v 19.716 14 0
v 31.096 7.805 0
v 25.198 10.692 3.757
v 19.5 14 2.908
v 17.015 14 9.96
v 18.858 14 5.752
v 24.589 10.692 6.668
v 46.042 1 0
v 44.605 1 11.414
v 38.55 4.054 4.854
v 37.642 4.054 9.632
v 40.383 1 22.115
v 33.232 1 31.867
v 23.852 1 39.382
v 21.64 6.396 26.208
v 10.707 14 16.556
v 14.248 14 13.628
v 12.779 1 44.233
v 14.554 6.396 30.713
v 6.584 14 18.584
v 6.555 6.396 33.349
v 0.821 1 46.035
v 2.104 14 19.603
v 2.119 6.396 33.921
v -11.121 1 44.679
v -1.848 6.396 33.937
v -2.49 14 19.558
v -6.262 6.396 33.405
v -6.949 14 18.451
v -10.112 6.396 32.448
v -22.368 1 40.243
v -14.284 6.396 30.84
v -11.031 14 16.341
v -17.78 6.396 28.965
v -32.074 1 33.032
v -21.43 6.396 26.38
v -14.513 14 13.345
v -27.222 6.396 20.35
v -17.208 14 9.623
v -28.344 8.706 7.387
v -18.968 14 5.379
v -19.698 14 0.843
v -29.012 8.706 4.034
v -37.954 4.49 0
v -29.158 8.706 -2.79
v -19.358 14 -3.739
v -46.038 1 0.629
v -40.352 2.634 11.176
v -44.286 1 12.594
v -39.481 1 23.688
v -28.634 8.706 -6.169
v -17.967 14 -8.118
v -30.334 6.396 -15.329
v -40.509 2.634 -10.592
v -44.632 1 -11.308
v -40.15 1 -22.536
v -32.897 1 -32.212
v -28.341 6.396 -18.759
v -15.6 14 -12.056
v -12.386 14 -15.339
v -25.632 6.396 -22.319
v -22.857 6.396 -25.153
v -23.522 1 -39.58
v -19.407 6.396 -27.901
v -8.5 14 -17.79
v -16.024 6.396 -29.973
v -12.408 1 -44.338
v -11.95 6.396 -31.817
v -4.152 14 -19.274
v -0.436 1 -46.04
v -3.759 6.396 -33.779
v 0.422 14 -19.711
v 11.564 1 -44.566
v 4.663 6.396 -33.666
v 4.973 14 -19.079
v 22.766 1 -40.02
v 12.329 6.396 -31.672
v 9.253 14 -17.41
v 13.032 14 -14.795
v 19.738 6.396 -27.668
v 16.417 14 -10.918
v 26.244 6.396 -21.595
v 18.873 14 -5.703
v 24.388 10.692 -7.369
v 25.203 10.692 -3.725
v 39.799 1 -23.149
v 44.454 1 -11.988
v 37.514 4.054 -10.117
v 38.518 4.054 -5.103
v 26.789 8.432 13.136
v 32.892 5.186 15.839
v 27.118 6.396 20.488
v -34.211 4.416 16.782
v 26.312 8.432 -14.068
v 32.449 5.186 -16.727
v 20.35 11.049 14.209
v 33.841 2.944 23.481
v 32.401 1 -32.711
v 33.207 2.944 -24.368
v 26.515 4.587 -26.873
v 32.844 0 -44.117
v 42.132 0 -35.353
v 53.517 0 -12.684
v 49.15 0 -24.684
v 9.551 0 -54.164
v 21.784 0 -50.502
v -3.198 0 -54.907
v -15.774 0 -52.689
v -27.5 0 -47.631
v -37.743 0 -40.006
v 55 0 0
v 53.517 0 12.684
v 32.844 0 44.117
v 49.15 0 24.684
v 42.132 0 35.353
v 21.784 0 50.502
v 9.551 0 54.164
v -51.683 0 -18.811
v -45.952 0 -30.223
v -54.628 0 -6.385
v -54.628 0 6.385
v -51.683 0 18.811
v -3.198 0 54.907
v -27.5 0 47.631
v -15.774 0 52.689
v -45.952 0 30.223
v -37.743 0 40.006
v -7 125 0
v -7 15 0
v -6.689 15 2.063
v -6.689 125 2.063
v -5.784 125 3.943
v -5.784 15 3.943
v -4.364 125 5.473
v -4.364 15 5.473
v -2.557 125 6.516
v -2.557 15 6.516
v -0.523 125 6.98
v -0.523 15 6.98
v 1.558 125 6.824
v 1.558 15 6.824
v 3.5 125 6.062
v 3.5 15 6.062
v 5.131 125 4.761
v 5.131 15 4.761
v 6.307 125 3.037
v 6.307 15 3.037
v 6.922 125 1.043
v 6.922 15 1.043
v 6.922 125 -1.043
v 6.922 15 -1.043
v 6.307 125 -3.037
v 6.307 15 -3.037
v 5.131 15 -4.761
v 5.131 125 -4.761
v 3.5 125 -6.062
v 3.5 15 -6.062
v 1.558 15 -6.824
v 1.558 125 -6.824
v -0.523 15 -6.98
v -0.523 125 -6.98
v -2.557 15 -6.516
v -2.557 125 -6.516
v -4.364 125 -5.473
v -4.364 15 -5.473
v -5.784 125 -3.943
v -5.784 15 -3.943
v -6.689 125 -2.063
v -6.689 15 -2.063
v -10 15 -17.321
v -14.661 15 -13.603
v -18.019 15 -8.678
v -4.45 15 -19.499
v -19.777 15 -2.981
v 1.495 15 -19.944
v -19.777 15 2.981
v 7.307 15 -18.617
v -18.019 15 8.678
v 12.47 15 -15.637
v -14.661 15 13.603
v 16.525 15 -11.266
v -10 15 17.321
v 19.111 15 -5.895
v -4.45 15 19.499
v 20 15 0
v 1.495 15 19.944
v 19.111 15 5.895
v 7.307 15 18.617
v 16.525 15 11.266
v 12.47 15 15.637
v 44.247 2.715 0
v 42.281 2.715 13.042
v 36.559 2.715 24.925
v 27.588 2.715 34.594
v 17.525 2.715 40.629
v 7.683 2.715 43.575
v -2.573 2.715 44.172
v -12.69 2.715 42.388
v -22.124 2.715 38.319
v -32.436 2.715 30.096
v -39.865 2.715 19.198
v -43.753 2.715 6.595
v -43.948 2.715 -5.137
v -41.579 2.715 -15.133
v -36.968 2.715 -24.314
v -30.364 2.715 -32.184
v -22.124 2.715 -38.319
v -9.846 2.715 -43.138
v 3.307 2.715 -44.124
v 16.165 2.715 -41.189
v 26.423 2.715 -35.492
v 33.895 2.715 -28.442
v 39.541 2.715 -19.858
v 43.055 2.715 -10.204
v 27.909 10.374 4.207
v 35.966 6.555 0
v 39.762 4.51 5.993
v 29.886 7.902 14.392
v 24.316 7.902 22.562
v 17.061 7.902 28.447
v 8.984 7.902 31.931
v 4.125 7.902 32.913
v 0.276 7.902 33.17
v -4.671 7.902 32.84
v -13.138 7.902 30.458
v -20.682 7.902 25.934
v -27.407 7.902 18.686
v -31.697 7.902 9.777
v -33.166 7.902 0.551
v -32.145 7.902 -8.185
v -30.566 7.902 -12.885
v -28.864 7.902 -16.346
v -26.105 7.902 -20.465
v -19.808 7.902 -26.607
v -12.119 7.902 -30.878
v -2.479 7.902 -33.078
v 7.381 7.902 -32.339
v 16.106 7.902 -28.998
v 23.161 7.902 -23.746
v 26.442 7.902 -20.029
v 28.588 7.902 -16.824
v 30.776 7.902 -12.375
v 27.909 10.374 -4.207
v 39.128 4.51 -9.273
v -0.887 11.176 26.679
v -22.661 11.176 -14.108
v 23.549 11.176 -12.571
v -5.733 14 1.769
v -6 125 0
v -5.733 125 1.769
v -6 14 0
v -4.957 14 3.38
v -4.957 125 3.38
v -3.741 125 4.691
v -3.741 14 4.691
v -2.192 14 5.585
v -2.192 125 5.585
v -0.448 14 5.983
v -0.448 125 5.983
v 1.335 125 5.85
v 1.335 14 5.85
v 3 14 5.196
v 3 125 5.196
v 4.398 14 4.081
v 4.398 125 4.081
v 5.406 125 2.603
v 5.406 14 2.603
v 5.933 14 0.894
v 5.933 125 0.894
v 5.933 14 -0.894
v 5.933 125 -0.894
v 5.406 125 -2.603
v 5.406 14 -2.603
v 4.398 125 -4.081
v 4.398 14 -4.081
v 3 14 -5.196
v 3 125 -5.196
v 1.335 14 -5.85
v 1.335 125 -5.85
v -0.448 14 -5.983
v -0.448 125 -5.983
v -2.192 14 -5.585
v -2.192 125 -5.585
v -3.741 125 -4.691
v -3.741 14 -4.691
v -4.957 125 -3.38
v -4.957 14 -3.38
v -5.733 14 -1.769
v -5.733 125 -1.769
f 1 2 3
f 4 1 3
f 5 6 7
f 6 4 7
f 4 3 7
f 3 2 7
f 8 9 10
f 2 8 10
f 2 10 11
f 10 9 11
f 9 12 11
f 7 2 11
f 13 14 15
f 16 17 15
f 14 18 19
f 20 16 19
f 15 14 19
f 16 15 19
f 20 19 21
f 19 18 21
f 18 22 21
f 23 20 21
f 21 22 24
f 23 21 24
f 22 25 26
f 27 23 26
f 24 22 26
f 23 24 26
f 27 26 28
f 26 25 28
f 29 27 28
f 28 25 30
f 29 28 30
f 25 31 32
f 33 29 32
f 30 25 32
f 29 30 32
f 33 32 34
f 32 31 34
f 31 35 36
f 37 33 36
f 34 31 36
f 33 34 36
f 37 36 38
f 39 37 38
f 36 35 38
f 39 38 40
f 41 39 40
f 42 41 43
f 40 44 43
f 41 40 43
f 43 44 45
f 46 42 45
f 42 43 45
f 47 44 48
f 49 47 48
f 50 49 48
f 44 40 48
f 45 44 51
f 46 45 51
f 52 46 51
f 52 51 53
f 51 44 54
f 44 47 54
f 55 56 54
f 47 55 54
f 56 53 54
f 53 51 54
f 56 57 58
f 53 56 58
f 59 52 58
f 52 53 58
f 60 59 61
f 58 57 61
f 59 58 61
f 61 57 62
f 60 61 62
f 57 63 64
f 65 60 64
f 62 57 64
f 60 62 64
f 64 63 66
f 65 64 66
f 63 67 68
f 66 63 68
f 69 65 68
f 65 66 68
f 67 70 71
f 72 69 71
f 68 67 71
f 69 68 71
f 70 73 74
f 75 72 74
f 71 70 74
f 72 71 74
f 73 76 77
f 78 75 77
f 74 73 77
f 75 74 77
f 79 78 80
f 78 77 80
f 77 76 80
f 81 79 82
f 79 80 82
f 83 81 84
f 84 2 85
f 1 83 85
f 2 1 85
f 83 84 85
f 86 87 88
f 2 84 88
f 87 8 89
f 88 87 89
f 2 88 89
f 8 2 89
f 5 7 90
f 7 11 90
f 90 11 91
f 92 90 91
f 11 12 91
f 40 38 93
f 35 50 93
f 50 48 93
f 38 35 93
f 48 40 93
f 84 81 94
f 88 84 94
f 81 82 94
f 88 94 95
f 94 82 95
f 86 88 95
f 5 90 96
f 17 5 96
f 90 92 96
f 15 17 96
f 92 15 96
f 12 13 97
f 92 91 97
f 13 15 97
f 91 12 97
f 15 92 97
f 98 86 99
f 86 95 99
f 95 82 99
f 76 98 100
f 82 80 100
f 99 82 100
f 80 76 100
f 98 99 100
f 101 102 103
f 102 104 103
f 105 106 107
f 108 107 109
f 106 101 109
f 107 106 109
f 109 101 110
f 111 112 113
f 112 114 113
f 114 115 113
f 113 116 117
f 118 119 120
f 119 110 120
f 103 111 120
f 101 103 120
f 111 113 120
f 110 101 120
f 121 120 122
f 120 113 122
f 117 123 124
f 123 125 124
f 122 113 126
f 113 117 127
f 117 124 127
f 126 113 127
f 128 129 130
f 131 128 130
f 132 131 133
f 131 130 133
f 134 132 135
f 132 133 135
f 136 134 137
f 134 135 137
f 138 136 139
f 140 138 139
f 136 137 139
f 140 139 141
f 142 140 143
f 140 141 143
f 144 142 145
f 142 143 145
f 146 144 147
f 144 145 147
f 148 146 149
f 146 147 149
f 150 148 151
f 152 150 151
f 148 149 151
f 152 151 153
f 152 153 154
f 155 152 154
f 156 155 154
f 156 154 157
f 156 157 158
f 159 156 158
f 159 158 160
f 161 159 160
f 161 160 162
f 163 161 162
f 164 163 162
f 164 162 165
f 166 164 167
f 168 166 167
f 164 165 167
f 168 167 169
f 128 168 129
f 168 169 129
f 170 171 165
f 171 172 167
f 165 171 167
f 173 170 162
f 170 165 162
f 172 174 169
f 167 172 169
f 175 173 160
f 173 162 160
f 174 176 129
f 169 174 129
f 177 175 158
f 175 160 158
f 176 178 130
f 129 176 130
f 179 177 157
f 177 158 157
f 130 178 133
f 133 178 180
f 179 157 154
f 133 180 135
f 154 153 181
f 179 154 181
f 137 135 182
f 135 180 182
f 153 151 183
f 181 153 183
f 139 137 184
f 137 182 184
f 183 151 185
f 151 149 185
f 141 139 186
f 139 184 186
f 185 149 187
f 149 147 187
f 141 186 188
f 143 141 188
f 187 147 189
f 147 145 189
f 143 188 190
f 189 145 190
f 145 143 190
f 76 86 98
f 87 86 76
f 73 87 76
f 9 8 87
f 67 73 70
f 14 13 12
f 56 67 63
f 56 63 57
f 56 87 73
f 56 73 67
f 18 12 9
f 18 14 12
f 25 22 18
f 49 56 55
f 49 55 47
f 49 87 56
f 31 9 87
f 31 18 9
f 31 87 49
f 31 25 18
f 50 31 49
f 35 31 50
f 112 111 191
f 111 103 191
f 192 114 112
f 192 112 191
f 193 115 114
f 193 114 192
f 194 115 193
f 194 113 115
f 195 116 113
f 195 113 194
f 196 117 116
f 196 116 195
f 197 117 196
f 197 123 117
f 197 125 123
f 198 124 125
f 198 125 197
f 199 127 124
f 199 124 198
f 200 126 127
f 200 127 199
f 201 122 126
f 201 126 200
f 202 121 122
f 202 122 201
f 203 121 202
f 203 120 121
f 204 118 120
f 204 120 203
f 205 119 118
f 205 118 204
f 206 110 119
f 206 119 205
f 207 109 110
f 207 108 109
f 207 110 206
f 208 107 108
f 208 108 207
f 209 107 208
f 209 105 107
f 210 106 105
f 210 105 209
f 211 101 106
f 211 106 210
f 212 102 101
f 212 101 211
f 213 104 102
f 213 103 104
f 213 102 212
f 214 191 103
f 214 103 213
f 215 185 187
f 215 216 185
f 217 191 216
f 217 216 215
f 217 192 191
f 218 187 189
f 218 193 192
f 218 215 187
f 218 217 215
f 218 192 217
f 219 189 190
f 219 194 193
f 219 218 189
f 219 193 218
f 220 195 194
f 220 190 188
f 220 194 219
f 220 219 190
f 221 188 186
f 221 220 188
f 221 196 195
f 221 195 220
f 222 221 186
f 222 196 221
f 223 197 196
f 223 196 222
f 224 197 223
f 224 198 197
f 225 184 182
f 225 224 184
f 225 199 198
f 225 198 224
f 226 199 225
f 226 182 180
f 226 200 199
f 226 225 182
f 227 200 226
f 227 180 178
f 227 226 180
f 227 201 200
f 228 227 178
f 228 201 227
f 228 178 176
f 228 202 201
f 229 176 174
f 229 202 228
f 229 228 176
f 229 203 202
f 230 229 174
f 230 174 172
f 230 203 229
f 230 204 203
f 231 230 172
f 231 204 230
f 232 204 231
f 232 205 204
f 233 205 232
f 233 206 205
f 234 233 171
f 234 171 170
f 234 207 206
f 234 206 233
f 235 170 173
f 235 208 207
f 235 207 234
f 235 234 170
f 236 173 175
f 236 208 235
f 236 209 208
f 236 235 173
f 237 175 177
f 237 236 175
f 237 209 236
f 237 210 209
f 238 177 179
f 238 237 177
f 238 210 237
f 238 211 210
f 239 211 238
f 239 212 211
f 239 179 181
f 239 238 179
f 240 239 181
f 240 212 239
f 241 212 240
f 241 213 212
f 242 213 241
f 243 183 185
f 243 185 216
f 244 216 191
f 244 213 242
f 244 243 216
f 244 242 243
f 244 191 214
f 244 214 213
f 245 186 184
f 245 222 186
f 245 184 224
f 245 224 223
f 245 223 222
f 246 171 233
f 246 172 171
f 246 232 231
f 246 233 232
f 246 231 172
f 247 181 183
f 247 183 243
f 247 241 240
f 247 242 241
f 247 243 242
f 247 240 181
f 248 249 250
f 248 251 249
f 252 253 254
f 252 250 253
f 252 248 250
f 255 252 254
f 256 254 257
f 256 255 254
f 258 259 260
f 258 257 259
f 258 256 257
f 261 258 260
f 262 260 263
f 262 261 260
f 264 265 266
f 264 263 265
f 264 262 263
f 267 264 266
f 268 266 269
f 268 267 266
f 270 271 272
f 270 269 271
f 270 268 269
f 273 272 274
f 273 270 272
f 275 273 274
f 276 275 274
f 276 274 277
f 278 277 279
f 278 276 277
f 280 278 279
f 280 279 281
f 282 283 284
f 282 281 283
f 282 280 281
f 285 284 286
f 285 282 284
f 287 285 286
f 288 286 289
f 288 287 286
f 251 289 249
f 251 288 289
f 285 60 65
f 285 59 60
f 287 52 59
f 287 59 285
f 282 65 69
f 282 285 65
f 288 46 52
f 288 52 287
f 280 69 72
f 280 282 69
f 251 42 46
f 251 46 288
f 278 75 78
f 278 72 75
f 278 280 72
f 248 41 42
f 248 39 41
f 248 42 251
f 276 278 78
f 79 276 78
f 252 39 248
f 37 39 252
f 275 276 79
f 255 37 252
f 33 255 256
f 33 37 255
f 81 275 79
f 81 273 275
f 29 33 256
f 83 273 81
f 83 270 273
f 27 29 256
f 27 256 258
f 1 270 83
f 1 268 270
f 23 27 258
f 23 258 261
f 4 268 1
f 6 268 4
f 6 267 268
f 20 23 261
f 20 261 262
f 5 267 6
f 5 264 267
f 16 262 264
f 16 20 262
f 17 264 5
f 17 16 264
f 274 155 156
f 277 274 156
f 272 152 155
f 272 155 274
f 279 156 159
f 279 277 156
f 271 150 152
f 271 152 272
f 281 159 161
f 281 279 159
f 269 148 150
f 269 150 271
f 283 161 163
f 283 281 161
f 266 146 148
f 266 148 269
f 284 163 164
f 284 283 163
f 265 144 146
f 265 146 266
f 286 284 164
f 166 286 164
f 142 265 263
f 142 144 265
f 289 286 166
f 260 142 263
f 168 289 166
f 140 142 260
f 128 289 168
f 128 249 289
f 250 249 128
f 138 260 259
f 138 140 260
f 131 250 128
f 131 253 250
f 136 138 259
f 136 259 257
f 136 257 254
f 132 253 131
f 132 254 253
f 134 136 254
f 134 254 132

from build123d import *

# Parameters (mm, degrees)
F2_R     = 7
F3_DEPTH = 110
F4_T     = -1


with BuildPart() as f1:
    # F0 (on Top) → F1 (revolve)
    with BuildSketch(Plane.XY):
        with BuildLine():
            Line((20, 15), (0, 15))
            Line((0, 15), (0, 0))
            Line((0, 0), (55, 0))
            add(Edge.make_bspline(
                [(20, 15), (26.4091145129, 11.0259934035), (39.2875073258, 5.0952762992), (46.8235665253, 1.1879222139), (55, 0)],
                knots=[0, 0, 0, 0, 0.5215307658, 1, 1, 1, 1], degree=3))
        make_face()
    revolve(axis=Axis((0, 7.5, 0), (0, -1, 0)))

    # F2 (on face) → F3 (join)
    with BuildSketch(Plane(origin=(0, 15, 0), x_dir=(-1, 0, 0), z_dir=(0, 1, 0))):
        Circle(F2_R)
    extrude(amount=F3_DEPTH)

    # F4
    f4_openings = [f1.faces().sort_by_distance(p)[0] for p in [
        (0, 125, 0),
    ]]
    offset(amount=F4_T, openings=f4_openings, kind=Kind.INTERSECTION)


solid = f1.part
